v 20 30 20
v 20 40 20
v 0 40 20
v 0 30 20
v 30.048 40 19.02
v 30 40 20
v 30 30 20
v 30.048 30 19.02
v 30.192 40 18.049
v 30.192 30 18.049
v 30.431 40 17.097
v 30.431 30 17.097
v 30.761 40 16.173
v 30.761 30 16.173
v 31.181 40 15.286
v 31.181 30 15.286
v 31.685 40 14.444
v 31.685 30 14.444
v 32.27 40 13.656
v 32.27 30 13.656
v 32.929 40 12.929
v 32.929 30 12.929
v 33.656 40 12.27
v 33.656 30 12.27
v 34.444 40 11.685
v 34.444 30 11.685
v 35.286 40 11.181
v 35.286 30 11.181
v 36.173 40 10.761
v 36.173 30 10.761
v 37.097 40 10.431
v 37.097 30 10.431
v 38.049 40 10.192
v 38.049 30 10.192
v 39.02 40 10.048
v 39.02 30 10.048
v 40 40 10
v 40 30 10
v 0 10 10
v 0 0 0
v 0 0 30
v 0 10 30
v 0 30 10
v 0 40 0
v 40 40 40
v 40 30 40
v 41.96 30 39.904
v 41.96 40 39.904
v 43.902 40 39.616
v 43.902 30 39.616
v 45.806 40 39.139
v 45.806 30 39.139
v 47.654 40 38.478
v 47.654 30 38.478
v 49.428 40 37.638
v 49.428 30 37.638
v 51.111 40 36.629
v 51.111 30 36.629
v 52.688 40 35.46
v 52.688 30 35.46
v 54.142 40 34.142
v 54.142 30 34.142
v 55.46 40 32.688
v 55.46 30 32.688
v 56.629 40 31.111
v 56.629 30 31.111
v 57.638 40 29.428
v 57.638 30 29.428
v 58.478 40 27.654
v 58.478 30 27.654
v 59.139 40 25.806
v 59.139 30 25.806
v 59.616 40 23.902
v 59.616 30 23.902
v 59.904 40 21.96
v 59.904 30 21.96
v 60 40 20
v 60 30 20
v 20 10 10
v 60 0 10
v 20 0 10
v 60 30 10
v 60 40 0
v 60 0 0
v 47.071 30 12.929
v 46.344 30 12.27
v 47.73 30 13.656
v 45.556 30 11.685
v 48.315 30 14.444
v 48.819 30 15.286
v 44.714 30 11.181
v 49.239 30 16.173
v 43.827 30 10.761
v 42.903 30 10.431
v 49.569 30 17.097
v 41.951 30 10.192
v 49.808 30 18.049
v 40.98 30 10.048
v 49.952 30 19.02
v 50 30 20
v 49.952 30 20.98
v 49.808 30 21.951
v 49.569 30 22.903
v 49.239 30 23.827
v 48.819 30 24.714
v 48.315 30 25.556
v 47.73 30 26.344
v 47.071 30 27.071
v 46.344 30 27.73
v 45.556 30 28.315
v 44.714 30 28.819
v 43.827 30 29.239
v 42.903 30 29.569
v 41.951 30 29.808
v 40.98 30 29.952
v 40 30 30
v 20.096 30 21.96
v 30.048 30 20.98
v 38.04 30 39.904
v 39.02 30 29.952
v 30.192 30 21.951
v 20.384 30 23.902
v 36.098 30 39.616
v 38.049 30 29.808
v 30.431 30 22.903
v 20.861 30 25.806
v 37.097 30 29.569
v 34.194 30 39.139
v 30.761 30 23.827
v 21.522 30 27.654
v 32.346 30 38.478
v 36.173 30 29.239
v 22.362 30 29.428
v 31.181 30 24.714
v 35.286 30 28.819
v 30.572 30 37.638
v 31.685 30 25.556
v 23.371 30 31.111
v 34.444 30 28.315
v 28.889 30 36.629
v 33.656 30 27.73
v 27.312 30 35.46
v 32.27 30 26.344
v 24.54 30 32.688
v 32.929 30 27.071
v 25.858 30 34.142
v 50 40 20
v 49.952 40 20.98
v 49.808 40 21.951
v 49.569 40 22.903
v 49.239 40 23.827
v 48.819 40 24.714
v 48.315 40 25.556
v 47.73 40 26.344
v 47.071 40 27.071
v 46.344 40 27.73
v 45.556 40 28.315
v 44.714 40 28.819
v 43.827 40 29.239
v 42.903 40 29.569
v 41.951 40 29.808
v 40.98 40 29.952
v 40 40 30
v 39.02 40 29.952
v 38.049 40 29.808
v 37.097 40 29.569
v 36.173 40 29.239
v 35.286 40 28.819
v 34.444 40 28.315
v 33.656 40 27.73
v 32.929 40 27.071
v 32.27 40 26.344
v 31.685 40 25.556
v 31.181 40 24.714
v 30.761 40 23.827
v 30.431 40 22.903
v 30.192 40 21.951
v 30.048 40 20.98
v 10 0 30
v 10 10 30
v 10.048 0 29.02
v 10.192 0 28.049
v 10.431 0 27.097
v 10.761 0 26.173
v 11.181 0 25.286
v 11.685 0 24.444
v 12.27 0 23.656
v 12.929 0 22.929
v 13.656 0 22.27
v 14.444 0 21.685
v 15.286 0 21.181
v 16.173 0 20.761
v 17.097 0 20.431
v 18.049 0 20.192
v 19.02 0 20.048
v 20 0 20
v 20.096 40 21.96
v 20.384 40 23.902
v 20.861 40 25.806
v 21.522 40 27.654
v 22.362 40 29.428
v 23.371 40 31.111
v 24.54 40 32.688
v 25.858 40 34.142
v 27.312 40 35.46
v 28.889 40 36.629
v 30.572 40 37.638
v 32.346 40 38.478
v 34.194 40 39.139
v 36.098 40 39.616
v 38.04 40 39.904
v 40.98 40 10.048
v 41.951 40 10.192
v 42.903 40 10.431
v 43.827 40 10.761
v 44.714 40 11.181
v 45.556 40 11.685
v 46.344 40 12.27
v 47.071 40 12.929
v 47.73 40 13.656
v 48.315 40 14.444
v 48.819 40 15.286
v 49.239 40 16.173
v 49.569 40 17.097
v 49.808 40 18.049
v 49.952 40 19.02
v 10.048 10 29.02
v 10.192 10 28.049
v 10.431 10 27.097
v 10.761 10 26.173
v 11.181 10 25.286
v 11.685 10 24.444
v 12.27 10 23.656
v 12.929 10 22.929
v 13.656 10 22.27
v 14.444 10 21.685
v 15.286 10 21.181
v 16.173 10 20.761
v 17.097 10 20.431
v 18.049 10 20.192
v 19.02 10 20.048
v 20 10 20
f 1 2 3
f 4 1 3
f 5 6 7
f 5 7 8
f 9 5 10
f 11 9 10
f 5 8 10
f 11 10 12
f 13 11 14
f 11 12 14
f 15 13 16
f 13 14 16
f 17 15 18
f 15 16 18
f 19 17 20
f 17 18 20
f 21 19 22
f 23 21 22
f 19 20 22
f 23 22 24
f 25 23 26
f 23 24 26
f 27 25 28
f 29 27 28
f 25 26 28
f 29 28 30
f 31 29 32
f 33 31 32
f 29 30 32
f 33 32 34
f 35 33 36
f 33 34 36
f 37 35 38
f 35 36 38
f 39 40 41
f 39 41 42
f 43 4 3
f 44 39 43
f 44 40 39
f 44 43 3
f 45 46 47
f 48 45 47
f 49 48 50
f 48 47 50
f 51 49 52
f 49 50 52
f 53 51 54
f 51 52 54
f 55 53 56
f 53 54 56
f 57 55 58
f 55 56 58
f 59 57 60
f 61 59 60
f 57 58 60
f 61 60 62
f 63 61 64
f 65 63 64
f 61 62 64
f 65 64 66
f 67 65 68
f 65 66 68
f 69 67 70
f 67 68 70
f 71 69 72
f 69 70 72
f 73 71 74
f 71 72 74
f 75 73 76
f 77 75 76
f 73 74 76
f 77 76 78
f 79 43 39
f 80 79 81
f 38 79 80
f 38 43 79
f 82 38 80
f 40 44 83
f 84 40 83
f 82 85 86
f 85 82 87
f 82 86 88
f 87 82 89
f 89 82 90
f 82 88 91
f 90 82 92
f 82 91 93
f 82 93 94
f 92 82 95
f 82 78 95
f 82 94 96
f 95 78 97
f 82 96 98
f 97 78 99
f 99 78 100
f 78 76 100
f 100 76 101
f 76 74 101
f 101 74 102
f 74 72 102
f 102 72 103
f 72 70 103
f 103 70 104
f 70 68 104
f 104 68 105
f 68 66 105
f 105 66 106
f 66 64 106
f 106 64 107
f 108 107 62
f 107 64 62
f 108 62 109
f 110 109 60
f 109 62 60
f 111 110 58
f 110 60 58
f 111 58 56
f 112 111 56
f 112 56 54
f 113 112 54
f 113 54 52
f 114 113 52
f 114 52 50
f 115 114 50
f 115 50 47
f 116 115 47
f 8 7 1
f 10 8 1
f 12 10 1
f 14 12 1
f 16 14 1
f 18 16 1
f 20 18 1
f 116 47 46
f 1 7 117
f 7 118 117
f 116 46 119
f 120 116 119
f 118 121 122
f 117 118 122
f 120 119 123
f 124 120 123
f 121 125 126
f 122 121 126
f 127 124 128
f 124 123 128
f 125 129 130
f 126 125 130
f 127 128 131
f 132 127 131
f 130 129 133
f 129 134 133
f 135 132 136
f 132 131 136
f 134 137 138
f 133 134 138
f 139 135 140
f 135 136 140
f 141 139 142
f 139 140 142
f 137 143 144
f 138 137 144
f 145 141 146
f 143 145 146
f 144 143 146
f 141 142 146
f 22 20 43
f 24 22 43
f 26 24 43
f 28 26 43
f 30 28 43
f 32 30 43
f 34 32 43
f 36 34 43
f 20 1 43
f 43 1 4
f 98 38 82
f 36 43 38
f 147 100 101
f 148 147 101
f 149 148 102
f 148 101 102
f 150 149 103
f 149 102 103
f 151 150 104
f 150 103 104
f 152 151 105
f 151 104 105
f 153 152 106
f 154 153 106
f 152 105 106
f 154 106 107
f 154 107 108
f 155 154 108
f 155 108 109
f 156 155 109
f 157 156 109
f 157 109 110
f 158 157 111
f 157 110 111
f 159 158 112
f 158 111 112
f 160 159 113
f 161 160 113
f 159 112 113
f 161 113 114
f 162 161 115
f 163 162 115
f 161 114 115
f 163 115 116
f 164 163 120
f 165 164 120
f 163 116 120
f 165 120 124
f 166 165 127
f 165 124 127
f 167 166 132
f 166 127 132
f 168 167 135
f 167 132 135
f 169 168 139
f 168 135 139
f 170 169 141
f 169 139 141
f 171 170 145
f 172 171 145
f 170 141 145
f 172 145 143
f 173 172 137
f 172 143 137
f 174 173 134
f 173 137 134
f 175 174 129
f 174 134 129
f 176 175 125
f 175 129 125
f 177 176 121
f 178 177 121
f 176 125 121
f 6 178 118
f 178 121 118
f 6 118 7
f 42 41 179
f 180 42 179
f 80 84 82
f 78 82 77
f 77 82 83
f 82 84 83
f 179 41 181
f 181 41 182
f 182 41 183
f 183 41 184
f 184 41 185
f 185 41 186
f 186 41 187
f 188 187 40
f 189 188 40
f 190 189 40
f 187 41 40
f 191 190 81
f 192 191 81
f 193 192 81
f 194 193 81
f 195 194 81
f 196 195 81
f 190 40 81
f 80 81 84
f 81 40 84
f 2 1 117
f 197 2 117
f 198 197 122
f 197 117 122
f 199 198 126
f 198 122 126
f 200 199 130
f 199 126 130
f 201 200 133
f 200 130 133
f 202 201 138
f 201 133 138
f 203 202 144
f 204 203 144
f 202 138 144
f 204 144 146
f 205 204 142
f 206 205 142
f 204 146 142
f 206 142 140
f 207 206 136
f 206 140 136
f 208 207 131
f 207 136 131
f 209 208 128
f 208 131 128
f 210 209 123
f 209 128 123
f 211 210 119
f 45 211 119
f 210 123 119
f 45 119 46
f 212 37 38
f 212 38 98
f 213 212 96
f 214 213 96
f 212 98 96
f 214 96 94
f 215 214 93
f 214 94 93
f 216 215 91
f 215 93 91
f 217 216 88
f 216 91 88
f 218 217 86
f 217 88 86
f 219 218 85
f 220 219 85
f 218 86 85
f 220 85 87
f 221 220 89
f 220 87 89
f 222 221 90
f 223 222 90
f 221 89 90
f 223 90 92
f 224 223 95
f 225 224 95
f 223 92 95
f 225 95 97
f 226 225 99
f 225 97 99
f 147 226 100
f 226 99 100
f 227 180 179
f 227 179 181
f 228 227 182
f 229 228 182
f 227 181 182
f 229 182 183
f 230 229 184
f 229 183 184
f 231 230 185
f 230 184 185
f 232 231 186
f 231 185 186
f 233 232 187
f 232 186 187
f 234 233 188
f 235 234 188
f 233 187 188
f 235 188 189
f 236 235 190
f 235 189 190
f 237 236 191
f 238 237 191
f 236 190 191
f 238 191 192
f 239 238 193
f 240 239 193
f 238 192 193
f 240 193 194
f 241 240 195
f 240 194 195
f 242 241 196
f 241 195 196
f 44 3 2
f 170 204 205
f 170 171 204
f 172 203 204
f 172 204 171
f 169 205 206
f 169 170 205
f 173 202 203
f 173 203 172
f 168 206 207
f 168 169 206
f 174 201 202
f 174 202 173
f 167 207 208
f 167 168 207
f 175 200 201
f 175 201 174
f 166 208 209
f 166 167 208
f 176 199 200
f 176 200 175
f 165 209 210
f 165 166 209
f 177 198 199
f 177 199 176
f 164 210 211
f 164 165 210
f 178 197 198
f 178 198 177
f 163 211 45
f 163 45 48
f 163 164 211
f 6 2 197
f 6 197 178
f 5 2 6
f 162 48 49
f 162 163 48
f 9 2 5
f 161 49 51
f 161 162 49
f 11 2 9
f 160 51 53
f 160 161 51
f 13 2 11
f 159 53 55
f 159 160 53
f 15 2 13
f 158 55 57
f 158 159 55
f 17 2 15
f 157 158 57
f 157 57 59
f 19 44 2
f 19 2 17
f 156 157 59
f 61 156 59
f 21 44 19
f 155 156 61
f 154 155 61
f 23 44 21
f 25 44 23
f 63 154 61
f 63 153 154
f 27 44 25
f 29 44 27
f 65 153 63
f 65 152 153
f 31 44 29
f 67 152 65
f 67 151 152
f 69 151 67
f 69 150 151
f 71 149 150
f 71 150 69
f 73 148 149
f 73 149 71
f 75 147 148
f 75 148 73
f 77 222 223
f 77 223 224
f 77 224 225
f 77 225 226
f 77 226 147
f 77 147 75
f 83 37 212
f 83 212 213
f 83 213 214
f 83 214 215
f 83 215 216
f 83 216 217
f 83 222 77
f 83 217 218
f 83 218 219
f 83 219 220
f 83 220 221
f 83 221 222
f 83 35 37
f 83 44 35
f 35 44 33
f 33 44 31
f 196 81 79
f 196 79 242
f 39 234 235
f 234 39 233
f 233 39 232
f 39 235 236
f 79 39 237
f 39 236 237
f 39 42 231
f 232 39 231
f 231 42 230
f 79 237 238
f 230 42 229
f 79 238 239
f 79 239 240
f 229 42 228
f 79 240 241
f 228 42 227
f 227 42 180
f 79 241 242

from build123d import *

# Parameters (mm, degrees)
F0_W      = 60
F0_H      = 40
F1_DEPTH  = 40
F2_W      = 20
F2_H      = 10
F3_DEPTH  = 10
F4_DEPTH  = 30
F5_W      = 60
F5_H      = 10
F6_DEPTH  = 10
F7_W      = 40
F7_H      = 20
F8_DEPTH  = 10
F10_DEPTH = 10
F11_W     = 20
F11_H     = 10
F12_DEPTH = 10
F14_DEPTH = 10


with BuildPart() as f1:
    # F0 (on Top) → F1 (new body)
    with BuildSketch(Plane.XY):
        with Locations((30, 20)):
            Rectangle(F0_W, F0_H)
    extrude(amount=F1_DEPTH)

    # F2 (on face) → F3 (cut)
    with BuildSketch(Plane.XY.offset(40)):
        with Locations((10, 35)):
            Rectangle(F2_W, F2_H)
    extrude(amount=-F3_DEPTH, mode=Mode.SUBTRACT)

    # F2 (on face) → F4 (cut)
    with BuildSketch(Plane.XY.offset(40)):
        Polygon((20, 30), (0, 30), (0, 10), (60, 10), (60, 30), align=None)
    extrude(amount=-F4_DEPTH, mode=Mode.SUBTRACT)

    # F5 (on face) → F6 (cut)
    with BuildSketch(Plane.XZ):
        with Locations((30, 35)):
            Rectangle(F5_W, F5_H)
    extrude(amount=-F6_DEPTH, mode=Mode.SUBTRACT)

    # F7 (on face) → F8 (cut)
    with BuildSketch(Plane.XZ):
        with Locations((40, 20)):
            Rectangle(F7_W, F7_H)
    extrude(amount=-F8_DEPTH, mode=Mode.SUBTRACT)

    # F9 (on face) → F10 (cut)
    with BuildSketch(Plane.XZ):
        with BuildLine():
            ThreePointArc((10, 30), (12.9289321881, 22.9289321881), (20, 20))
            Line((20, 20), (20, 30))
            Line((20, 30), (10, 30))
        make_face()
    extrude(amount=-F10_DEPTH, mode=Mode.SUBTRACT)

    # F11 (on face) → F12 (cut)
    with BuildSketch(Plane(origin=(0, 40, 0), x_dir=(-1, 0, 0), z_dir=(0, 1, 0))):
        with Locations((-10, 25)):
            Rectangle(F11_W, F11_H)
    extrude(amount=-F12_DEPTH, mode=Mode.SUBTRACT)

    # F13 (on face) → F14 (cut)
    with BuildSketch(Plane.XZ.offset(-30)):
        with BuildLine():
            Line((40, 20), (50, 20))
            ThreePointArc((50, 20), (40, 30), (30, 20))
            Line((30, 20), (40, 20))
        make_face()
        with BuildLine():
            ThreePointArc((30, 20), (32.9289321881, 12.9289321881), (40, 10))
            ThreePointArc((40, 10), (47.0710678119, 12.9289321881), (50, 20))
            Line((50, 20), (40, 20))
            Line((40, 20), (30, 20))
        make_face()
        with BuildLine():
            ThreePointArc((40, 40), (54.1421356237, 34.1421356237), (60, 20))
            Line((60, 20), (60, 40))
            Line((60, 40), (40, 40))
        make_face()
        with BuildLine():
            ThreePointArc((20, 20), (25.8578643763, 34.1421356237), (40, 40))
            Line((40, 40), (20, 40))
            Line((20, 40), (20, 20))
        make_face()
    extrude(amount=-F14_DEPTH, mode=Mode.SUBTRACT)


solid = f1.part
